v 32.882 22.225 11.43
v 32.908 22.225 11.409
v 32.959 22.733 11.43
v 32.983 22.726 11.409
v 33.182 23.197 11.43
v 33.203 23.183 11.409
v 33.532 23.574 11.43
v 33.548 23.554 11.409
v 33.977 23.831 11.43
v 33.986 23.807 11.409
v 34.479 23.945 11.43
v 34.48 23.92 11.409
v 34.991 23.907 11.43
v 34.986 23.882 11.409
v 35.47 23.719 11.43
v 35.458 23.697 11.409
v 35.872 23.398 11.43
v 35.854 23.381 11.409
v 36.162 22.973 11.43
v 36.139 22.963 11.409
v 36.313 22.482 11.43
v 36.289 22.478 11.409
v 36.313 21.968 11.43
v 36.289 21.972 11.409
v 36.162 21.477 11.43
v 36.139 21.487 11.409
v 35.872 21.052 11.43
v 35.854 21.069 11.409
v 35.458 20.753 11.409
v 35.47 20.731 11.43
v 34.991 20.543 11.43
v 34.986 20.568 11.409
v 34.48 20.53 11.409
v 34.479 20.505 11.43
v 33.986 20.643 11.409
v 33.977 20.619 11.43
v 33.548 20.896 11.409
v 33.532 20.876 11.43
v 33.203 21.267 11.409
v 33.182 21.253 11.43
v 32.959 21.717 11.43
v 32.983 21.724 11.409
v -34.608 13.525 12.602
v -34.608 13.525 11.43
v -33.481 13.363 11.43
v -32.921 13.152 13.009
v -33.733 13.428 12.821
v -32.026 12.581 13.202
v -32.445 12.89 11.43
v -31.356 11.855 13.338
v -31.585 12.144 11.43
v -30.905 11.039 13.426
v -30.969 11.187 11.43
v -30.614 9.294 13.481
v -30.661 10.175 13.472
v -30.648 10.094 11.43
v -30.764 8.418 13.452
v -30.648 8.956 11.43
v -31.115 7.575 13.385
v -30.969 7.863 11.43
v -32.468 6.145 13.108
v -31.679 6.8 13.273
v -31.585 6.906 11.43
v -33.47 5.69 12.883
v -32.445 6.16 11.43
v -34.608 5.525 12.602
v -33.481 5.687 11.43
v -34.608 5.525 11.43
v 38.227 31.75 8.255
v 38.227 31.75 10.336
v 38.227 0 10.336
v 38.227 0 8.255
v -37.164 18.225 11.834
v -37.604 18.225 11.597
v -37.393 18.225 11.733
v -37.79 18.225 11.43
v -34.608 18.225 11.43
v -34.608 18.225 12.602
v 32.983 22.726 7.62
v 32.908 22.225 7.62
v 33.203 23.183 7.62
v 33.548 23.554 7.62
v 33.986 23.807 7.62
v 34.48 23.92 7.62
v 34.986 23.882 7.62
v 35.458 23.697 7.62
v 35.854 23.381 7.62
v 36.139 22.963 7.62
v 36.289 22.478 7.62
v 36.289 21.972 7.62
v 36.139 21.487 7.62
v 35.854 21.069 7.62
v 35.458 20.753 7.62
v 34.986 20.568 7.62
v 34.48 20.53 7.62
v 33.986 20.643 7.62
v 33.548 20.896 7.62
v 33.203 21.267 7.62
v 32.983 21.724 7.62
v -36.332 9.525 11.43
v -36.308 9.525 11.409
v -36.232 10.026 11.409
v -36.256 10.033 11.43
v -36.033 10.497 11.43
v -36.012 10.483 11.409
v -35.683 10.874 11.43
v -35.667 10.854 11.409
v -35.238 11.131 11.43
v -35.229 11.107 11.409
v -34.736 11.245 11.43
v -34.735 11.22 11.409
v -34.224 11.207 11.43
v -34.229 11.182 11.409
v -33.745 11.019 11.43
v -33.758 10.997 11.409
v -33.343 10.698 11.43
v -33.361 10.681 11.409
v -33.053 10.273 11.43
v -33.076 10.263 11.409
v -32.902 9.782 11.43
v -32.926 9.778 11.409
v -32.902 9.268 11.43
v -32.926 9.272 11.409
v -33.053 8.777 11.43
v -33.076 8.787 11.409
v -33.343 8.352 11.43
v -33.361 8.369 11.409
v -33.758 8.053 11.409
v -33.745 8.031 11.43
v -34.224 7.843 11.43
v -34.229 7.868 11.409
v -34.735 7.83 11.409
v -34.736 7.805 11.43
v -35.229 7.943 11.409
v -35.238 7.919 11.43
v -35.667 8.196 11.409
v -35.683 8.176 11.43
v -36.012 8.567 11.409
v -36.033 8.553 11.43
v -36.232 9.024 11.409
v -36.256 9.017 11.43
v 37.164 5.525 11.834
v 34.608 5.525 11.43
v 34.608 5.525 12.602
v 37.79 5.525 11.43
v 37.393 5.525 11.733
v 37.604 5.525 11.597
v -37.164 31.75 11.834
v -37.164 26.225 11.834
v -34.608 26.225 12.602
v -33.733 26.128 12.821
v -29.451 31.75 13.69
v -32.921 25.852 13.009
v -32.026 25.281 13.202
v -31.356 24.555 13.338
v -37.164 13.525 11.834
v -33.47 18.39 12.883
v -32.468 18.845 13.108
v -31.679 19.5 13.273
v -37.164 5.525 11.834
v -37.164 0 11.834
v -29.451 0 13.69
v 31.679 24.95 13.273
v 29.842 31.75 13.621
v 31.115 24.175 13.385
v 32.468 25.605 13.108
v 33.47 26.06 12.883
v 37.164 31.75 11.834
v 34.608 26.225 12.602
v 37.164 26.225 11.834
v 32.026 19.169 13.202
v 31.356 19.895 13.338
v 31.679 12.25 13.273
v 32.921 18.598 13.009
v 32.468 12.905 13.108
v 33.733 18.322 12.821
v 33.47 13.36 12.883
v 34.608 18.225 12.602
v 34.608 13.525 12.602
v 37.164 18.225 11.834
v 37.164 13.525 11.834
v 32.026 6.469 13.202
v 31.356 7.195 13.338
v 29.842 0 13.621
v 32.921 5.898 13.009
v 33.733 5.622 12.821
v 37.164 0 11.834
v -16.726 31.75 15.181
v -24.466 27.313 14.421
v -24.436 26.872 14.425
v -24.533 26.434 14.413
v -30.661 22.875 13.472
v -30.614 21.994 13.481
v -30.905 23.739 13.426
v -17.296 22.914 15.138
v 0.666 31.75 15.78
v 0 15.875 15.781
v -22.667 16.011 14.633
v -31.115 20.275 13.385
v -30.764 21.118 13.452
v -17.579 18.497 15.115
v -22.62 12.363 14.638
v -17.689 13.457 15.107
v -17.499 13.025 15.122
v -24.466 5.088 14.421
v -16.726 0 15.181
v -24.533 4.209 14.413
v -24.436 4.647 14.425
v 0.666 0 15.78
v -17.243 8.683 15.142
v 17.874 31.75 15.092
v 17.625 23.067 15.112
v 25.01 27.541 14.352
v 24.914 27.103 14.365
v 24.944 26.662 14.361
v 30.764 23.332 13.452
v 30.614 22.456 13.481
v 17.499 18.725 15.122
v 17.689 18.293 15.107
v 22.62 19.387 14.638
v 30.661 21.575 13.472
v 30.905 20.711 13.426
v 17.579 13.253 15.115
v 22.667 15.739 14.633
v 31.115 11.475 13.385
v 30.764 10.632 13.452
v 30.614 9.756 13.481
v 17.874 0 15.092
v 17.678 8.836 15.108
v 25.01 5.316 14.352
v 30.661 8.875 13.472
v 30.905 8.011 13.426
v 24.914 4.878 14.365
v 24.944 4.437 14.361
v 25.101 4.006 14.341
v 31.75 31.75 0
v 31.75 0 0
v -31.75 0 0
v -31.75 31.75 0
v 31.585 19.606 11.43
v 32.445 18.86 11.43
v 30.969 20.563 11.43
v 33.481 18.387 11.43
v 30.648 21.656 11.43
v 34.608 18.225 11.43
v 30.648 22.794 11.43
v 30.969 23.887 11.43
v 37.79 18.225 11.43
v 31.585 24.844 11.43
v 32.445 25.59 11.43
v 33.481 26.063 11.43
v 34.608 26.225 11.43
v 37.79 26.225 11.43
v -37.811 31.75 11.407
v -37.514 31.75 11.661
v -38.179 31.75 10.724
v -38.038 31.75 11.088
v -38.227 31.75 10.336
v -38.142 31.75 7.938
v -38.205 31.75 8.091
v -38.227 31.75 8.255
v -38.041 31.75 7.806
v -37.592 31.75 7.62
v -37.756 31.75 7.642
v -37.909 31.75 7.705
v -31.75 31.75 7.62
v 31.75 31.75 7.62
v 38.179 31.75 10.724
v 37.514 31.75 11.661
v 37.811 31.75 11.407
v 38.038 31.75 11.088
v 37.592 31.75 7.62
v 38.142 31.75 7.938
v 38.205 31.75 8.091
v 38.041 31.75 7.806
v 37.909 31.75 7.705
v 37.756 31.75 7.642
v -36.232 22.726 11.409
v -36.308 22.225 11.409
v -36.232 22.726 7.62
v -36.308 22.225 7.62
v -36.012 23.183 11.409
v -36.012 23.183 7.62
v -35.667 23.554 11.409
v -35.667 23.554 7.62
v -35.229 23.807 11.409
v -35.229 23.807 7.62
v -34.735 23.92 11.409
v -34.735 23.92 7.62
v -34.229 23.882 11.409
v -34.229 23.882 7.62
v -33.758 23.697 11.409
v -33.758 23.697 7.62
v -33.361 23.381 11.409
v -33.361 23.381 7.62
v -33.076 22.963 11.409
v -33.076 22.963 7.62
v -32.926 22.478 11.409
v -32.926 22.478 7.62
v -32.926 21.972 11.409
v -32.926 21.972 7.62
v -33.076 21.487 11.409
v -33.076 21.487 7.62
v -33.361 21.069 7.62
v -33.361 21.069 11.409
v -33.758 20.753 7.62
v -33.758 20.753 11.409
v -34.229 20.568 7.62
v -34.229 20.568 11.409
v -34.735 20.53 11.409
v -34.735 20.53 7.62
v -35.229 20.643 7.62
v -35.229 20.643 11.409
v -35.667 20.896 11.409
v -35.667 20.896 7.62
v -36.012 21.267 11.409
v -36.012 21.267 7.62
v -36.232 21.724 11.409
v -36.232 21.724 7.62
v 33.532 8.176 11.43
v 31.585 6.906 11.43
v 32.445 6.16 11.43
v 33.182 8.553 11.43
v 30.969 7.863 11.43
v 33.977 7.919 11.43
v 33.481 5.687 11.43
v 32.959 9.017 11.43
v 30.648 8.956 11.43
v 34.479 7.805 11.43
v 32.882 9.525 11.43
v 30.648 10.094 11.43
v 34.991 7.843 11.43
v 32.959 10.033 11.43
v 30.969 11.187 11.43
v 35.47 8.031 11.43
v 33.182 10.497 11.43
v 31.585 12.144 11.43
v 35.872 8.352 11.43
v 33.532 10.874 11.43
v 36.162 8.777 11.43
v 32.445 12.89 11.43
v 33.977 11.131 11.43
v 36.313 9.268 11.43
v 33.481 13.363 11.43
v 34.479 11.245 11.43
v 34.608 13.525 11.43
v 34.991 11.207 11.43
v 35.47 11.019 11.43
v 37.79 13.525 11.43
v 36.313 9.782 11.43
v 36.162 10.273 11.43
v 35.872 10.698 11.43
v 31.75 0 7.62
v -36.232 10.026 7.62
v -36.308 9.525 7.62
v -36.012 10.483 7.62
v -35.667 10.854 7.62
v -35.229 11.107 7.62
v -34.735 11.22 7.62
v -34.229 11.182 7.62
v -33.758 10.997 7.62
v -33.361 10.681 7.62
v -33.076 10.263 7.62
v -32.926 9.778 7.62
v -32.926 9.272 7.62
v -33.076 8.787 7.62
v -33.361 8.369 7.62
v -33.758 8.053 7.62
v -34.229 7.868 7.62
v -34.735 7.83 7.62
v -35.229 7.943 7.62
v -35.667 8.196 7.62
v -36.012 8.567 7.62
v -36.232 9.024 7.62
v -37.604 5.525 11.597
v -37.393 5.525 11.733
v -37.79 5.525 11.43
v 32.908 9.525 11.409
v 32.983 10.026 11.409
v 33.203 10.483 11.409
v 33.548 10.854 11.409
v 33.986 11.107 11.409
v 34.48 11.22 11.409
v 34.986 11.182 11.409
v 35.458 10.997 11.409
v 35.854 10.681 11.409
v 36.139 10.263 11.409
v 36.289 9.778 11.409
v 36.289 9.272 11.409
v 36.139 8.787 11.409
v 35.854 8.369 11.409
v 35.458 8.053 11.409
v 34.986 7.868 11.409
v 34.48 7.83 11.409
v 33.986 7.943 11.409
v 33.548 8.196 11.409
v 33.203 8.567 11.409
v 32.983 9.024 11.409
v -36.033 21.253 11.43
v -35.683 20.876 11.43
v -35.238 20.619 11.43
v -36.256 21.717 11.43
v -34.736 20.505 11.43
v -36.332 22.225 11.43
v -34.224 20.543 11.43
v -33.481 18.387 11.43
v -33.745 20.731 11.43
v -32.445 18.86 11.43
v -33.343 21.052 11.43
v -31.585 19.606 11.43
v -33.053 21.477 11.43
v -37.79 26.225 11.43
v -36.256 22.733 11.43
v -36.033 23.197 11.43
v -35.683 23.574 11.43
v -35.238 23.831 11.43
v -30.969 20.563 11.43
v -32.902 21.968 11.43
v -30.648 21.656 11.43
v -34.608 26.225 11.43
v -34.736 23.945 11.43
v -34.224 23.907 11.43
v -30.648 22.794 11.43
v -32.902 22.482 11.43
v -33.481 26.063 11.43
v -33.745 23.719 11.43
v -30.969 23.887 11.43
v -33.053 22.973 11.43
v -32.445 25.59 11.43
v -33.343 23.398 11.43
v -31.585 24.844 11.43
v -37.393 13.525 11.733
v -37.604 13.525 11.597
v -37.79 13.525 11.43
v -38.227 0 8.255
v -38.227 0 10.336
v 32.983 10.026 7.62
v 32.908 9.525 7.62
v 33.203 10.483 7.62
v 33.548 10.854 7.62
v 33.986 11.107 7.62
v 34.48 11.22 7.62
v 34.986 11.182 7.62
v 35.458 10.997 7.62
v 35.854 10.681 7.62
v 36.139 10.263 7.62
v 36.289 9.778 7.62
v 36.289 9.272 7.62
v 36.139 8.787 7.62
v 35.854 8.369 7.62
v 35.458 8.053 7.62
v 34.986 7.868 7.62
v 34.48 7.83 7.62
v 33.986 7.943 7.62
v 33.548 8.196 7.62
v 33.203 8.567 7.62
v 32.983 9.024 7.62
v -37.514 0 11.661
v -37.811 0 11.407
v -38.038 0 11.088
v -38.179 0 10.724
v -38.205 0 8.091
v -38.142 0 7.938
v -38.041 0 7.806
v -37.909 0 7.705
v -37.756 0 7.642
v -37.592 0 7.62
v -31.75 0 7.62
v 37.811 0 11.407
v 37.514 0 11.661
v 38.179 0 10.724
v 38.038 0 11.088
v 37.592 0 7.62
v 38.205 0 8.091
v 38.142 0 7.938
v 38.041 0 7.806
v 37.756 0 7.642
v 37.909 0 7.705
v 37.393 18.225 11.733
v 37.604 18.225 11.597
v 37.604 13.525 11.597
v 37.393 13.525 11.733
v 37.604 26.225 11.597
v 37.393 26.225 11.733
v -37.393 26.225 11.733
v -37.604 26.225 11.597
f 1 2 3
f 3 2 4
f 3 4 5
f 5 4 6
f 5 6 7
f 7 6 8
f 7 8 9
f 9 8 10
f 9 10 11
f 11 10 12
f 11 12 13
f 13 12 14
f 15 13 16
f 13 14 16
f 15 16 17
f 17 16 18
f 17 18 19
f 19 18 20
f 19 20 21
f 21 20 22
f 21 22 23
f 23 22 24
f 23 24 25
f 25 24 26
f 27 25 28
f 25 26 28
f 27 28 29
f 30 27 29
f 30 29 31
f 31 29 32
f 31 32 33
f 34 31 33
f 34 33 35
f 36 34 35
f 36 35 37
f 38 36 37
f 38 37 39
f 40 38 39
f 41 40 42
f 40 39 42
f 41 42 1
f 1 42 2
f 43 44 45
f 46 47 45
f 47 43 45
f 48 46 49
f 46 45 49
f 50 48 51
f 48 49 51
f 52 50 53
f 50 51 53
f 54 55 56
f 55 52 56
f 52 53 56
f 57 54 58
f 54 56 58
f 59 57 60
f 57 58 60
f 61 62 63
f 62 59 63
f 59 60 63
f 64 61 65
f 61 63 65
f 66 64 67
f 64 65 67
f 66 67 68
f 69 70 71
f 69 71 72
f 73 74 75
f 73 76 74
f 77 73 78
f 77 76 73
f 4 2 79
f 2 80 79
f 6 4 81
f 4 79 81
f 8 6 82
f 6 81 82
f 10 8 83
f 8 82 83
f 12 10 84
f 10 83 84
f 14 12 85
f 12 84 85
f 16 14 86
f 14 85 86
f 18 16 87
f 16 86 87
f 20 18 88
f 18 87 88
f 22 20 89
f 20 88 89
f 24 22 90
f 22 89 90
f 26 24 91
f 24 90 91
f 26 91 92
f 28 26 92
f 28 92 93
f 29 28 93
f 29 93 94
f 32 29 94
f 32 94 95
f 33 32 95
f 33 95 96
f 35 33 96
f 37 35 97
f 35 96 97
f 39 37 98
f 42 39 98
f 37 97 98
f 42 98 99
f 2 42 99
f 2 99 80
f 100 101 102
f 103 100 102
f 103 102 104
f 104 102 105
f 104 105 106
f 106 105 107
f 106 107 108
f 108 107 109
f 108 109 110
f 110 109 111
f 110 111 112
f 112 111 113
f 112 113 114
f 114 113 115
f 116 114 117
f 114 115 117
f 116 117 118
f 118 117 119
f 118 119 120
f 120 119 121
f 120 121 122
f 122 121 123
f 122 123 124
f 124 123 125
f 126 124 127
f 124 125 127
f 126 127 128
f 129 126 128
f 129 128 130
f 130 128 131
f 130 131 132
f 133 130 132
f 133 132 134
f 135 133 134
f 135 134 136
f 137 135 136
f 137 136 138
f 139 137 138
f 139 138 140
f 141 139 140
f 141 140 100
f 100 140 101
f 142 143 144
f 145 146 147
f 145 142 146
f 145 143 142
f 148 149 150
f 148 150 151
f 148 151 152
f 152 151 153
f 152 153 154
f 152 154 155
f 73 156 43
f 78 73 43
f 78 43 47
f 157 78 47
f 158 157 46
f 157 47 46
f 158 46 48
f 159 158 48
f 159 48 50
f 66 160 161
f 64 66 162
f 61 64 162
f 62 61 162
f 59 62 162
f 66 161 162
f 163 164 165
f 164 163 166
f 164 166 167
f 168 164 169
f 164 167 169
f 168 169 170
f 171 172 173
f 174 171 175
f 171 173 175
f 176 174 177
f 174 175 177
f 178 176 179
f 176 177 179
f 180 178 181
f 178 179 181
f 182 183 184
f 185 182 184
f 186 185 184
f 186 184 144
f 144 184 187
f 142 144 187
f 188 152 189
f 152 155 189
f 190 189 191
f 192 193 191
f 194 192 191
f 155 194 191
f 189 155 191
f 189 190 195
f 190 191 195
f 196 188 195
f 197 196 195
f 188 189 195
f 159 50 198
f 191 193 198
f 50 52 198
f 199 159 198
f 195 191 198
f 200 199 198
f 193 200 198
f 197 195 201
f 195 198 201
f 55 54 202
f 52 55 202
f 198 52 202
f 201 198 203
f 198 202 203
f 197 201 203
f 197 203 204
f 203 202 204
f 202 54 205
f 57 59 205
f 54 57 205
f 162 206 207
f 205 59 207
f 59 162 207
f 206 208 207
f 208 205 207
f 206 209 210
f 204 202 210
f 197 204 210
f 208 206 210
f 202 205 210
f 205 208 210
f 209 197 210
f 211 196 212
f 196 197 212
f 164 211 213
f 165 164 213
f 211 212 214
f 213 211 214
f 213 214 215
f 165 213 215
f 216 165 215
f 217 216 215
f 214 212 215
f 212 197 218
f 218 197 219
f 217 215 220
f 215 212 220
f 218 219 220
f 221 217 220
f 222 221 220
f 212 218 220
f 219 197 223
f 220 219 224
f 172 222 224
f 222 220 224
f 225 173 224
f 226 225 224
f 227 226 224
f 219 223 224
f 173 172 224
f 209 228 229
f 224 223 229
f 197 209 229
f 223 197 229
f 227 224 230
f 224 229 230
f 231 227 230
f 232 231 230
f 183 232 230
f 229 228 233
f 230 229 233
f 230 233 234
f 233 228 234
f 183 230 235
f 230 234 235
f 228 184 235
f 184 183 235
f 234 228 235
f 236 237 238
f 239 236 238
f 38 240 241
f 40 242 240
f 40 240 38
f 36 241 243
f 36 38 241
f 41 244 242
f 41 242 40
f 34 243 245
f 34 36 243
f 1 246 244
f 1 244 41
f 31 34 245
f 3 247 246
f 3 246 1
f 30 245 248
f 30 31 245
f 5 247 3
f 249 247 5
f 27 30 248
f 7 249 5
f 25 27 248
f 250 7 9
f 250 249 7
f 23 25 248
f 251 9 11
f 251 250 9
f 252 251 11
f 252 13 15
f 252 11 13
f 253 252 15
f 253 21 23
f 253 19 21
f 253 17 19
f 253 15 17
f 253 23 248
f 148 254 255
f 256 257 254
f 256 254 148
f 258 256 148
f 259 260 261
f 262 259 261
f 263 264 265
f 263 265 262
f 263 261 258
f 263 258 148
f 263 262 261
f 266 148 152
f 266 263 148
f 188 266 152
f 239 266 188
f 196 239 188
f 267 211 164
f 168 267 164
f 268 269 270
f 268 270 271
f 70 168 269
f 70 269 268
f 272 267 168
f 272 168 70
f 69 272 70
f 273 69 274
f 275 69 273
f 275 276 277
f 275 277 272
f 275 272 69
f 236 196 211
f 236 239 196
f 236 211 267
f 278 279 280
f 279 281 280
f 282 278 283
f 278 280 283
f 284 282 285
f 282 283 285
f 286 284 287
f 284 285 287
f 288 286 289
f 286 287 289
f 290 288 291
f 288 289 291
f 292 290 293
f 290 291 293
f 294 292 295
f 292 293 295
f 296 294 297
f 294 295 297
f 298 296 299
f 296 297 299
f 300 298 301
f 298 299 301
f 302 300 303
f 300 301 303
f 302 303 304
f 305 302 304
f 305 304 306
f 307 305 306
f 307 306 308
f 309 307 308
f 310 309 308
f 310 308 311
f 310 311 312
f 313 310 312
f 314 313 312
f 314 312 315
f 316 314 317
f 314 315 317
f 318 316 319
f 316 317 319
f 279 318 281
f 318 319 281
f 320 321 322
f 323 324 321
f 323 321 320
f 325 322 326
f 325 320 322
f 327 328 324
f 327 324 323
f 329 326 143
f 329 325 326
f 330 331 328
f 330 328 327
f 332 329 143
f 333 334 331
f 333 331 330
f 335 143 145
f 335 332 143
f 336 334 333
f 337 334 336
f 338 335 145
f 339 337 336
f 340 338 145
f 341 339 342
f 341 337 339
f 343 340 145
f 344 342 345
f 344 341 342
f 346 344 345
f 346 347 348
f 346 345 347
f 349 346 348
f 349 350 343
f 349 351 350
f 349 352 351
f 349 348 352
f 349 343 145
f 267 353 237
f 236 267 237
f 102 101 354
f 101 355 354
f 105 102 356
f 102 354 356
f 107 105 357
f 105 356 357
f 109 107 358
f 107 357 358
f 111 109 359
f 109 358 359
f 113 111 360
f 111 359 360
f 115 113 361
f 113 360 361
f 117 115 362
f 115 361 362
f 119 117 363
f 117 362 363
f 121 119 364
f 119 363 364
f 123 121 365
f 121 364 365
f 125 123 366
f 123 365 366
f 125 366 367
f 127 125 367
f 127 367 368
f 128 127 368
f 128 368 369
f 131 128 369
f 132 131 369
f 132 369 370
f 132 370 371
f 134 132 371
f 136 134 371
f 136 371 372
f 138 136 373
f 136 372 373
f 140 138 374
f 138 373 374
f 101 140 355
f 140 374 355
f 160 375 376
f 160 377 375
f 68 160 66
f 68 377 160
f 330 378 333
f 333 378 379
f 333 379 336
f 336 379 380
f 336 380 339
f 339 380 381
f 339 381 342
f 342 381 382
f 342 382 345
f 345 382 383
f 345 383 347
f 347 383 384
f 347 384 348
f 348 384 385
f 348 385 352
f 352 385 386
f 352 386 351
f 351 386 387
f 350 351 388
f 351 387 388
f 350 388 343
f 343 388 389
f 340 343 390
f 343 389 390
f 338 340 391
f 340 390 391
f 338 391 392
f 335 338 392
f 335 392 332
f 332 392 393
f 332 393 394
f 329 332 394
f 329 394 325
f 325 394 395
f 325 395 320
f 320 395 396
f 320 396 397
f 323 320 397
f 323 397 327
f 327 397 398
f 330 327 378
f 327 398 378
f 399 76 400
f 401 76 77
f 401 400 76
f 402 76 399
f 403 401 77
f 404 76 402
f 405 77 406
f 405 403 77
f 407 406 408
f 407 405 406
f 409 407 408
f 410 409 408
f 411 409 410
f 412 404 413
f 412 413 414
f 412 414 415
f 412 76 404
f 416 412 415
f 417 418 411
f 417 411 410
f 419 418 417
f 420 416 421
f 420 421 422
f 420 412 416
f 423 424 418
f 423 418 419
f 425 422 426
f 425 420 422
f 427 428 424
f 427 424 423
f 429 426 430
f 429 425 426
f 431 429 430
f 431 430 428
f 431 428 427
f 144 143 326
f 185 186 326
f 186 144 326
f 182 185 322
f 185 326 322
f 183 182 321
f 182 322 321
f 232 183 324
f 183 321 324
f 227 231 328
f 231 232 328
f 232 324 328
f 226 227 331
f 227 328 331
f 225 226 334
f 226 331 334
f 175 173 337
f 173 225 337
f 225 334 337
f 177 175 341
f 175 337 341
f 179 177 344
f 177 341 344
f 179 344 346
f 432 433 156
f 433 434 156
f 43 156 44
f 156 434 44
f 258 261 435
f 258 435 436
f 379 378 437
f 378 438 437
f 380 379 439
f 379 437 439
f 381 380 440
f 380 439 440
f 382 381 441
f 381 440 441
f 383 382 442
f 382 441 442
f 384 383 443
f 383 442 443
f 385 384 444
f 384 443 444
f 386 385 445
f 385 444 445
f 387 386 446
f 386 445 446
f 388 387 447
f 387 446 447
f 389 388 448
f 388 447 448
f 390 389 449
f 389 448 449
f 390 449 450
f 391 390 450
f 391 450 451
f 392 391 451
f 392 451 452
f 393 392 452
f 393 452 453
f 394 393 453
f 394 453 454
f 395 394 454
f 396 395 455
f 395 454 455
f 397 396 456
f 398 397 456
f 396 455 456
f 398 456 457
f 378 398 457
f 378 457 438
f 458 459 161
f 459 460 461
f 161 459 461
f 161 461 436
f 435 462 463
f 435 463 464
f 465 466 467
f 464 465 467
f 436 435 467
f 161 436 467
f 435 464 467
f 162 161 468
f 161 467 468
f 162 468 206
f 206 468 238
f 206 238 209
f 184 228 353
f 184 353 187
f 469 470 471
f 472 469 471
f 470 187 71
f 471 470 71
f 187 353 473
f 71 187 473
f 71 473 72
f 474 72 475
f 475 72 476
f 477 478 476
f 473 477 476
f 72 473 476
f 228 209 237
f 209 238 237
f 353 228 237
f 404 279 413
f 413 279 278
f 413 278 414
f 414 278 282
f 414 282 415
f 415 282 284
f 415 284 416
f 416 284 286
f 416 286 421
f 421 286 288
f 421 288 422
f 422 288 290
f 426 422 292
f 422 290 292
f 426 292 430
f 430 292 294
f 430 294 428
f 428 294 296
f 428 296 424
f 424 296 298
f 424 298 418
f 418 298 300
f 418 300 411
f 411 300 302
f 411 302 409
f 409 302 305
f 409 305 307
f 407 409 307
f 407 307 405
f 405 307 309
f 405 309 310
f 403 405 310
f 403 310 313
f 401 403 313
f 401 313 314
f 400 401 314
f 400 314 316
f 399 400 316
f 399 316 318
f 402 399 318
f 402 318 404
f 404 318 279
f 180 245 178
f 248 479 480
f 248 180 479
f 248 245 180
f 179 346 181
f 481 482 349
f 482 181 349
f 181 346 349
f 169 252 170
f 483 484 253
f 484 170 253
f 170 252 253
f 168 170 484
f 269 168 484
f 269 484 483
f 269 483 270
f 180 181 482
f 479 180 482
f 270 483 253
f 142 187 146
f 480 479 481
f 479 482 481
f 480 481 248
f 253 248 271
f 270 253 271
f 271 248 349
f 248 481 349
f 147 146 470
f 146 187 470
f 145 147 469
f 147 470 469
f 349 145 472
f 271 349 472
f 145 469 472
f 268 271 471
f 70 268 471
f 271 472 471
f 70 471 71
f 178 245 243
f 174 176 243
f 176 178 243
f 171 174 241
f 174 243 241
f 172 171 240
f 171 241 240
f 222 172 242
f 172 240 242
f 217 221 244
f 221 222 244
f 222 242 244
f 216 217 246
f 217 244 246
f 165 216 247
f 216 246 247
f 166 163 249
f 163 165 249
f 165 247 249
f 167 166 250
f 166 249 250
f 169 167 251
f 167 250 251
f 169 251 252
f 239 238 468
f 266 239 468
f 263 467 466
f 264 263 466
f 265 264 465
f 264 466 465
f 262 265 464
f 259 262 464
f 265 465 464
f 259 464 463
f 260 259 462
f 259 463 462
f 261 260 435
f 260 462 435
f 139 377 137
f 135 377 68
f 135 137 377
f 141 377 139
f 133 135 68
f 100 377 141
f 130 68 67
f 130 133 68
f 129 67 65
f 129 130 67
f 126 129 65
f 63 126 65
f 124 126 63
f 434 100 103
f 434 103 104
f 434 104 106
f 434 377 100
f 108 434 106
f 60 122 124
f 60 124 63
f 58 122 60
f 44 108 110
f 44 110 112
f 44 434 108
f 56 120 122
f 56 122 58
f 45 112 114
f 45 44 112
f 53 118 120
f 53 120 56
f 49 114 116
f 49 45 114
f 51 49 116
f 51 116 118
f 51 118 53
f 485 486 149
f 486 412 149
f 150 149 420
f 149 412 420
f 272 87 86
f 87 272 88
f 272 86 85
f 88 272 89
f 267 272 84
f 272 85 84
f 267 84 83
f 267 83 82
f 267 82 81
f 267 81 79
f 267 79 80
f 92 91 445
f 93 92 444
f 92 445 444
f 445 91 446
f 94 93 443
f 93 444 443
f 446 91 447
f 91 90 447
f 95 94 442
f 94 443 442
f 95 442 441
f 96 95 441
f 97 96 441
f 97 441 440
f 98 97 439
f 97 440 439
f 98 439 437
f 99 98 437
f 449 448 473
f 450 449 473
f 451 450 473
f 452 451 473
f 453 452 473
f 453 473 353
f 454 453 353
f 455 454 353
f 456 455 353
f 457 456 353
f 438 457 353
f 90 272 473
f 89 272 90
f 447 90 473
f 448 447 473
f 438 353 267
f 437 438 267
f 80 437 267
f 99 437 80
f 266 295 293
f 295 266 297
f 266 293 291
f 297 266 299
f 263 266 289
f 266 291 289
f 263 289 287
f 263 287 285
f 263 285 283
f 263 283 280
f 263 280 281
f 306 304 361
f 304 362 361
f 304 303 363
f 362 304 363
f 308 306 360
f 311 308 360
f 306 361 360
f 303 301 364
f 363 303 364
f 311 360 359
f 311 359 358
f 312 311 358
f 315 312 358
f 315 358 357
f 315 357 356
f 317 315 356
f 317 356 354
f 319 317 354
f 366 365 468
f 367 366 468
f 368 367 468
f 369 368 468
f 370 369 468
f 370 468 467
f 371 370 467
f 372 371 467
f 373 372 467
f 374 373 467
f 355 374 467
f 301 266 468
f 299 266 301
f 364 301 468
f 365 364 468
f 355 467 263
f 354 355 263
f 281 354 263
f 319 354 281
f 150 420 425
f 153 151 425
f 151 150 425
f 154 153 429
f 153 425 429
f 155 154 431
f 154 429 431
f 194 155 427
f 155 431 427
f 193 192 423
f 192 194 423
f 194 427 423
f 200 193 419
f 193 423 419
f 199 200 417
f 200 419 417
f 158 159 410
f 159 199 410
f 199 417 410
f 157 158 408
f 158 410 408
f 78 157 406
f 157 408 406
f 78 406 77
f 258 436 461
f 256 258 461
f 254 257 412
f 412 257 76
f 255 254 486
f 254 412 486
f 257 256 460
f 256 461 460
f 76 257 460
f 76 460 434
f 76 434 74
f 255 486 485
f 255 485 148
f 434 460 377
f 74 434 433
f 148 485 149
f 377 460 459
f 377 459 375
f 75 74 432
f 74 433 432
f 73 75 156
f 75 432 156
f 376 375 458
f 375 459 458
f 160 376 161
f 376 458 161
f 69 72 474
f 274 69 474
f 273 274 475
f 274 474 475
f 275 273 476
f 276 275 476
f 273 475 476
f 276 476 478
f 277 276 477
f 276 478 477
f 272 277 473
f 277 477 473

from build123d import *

# Parameters (mm, degrees)
BOSS_EXTRUDE1_DEPTH            = 31.75
SKETCH3_W                      = 3.6195
SKETCH3_H                      = 8
CUT_EXTRUDE1_DEPTH             = 51.990302463
M3_CLEARANCE_HOLE1_D           = 3.4
M3_CLEARANCE_HOLE1_CSINK_D     = 3.45
M3_CLEARANCE_HOLE1_CSINK_ANGLE = 100


with BuildPart() as part:
    # Sketch1 → Boss-Extrude1 (new body)
    with BuildSketch(Plane(origin=(0, 0, 0), x_dir=(1, 0, 0), z_dir=(0, 1, 0))):
        with BuildLine():
            Line((31.75, -7.62), (31.75, 0))
            Line((31.75, 0), (-31.75, 0))
            Line((-31.75, 0), (-31.75, -7.62))
            Line((-31.75, -7.62), (-37.465, -7.62))
            Line((-37.465, -7.62), (-37.592, -7.62))
            ThreePointArc((-37.592, -7.62), (-38.041012806, -7.805987194), (-38.227, -8.255))
            Line((-38.227, -8.255), (-38.227, -10.33620332))
            ThreePointArc((-38.227, -10.33620332), (-37.934339966, -11.254650768), (-37.164265243, -11.834461539))
            add(Edge.make_bspline(
                [(-37.164265243, -11.834461539), (0, -24.85125292), (37.164265243, -11.834461539)],
                knots=[0.466080532, 0.466080532, 0.466080532, 2.675512121, 2.675512121, 2.675512121], degree=2, weights=[0.959649984, 0.417495947, 0.959649984]))
            ThreePointArc((37.164265243, -11.834461539), (37.934339966, -11.254650768), (38.227, -10.33620332))
            Line((38.227, -10.33620332), (38.227, -8.255))
            ThreePointArc((38.227, -8.255), (38.041012806, -7.805987194), (37.592, -7.62))
            Line((37.592, -7.62), (37.465, -7.62))
            Line((37.465, -7.62), (31.75, -7.62))
        make_face()
    extrude(amount=BOSS_EXTRUDE1_DEPTH)

    # Sketch3 → Cut-Extrude1 (cut, through all)
    with BuildSketch(Plane.XY.offset(11.43)):
        with Locations((-36.41725, 22.225)):
            Rectangle(SKETCH3_W, SKETCH3_H)
        with BuildLine():
            ThreePointArc((-34.6075, 26.225), (-30.6075, 22.225), (-34.6075, 18.225))
            Line((-34.6075, 18.225), (-34.6075, 26.225))
        make_face()
        with Locations((-36.41725, 9.525)):
            Rectangle(SKETCH3_W, SKETCH3_H)
        with BuildLine():
            ThreePointArc((-34.6075, 13.525), (-30.6075, 9.525), (-34.6075, 5.525))
            Line((-34.6075, 5.525), (-34.6075, 13.525))
        make_face()
        with Locations((36.41725, 9.525)):
            Rectangle(SKETCH3_W, SKETCH3_H)
        with BuildLine():
            Line((34.6075, 13.525), (34.6075, 5.525))
            ThreePointArc((34.6075, 5.525), (30.6075, 9.525), (34.6075, 13.525))
        make_face()
        with Locations((36.41725, 22.225)):
            Rectangle(SKETCH3_W, SKETCH3_H)
        with BuildLine():
            Line((34.6075, 26.225), (34.6075, 18.225))
            ThreePointArc((34.6075, 18.225), (30.6075, 22.225), (34.6075, 26.225))
        make_face()
    extrude(amount=CUT_EXTRUDE1_DEPTH, mode=Mode.SUBTRACT)

    # M3 Clearance Hole1 (through all)
    with Locations(Plane.XY.offset(11.43)):
        with Locations((-34.6075, 22.225), (-34.6075, 9.525), (34.6075, 22.225), (34.6075, 9.525)):
            CounterSinkHole(M3_CLEARANCE_HOLE1_D / 2, M3_CLEARANCE_HOLE1_CSINK_D / 2, counter_sink_angle=M3_CLEARANCE_HOLE1_CSINK_ANGLE)


solid = part.part
